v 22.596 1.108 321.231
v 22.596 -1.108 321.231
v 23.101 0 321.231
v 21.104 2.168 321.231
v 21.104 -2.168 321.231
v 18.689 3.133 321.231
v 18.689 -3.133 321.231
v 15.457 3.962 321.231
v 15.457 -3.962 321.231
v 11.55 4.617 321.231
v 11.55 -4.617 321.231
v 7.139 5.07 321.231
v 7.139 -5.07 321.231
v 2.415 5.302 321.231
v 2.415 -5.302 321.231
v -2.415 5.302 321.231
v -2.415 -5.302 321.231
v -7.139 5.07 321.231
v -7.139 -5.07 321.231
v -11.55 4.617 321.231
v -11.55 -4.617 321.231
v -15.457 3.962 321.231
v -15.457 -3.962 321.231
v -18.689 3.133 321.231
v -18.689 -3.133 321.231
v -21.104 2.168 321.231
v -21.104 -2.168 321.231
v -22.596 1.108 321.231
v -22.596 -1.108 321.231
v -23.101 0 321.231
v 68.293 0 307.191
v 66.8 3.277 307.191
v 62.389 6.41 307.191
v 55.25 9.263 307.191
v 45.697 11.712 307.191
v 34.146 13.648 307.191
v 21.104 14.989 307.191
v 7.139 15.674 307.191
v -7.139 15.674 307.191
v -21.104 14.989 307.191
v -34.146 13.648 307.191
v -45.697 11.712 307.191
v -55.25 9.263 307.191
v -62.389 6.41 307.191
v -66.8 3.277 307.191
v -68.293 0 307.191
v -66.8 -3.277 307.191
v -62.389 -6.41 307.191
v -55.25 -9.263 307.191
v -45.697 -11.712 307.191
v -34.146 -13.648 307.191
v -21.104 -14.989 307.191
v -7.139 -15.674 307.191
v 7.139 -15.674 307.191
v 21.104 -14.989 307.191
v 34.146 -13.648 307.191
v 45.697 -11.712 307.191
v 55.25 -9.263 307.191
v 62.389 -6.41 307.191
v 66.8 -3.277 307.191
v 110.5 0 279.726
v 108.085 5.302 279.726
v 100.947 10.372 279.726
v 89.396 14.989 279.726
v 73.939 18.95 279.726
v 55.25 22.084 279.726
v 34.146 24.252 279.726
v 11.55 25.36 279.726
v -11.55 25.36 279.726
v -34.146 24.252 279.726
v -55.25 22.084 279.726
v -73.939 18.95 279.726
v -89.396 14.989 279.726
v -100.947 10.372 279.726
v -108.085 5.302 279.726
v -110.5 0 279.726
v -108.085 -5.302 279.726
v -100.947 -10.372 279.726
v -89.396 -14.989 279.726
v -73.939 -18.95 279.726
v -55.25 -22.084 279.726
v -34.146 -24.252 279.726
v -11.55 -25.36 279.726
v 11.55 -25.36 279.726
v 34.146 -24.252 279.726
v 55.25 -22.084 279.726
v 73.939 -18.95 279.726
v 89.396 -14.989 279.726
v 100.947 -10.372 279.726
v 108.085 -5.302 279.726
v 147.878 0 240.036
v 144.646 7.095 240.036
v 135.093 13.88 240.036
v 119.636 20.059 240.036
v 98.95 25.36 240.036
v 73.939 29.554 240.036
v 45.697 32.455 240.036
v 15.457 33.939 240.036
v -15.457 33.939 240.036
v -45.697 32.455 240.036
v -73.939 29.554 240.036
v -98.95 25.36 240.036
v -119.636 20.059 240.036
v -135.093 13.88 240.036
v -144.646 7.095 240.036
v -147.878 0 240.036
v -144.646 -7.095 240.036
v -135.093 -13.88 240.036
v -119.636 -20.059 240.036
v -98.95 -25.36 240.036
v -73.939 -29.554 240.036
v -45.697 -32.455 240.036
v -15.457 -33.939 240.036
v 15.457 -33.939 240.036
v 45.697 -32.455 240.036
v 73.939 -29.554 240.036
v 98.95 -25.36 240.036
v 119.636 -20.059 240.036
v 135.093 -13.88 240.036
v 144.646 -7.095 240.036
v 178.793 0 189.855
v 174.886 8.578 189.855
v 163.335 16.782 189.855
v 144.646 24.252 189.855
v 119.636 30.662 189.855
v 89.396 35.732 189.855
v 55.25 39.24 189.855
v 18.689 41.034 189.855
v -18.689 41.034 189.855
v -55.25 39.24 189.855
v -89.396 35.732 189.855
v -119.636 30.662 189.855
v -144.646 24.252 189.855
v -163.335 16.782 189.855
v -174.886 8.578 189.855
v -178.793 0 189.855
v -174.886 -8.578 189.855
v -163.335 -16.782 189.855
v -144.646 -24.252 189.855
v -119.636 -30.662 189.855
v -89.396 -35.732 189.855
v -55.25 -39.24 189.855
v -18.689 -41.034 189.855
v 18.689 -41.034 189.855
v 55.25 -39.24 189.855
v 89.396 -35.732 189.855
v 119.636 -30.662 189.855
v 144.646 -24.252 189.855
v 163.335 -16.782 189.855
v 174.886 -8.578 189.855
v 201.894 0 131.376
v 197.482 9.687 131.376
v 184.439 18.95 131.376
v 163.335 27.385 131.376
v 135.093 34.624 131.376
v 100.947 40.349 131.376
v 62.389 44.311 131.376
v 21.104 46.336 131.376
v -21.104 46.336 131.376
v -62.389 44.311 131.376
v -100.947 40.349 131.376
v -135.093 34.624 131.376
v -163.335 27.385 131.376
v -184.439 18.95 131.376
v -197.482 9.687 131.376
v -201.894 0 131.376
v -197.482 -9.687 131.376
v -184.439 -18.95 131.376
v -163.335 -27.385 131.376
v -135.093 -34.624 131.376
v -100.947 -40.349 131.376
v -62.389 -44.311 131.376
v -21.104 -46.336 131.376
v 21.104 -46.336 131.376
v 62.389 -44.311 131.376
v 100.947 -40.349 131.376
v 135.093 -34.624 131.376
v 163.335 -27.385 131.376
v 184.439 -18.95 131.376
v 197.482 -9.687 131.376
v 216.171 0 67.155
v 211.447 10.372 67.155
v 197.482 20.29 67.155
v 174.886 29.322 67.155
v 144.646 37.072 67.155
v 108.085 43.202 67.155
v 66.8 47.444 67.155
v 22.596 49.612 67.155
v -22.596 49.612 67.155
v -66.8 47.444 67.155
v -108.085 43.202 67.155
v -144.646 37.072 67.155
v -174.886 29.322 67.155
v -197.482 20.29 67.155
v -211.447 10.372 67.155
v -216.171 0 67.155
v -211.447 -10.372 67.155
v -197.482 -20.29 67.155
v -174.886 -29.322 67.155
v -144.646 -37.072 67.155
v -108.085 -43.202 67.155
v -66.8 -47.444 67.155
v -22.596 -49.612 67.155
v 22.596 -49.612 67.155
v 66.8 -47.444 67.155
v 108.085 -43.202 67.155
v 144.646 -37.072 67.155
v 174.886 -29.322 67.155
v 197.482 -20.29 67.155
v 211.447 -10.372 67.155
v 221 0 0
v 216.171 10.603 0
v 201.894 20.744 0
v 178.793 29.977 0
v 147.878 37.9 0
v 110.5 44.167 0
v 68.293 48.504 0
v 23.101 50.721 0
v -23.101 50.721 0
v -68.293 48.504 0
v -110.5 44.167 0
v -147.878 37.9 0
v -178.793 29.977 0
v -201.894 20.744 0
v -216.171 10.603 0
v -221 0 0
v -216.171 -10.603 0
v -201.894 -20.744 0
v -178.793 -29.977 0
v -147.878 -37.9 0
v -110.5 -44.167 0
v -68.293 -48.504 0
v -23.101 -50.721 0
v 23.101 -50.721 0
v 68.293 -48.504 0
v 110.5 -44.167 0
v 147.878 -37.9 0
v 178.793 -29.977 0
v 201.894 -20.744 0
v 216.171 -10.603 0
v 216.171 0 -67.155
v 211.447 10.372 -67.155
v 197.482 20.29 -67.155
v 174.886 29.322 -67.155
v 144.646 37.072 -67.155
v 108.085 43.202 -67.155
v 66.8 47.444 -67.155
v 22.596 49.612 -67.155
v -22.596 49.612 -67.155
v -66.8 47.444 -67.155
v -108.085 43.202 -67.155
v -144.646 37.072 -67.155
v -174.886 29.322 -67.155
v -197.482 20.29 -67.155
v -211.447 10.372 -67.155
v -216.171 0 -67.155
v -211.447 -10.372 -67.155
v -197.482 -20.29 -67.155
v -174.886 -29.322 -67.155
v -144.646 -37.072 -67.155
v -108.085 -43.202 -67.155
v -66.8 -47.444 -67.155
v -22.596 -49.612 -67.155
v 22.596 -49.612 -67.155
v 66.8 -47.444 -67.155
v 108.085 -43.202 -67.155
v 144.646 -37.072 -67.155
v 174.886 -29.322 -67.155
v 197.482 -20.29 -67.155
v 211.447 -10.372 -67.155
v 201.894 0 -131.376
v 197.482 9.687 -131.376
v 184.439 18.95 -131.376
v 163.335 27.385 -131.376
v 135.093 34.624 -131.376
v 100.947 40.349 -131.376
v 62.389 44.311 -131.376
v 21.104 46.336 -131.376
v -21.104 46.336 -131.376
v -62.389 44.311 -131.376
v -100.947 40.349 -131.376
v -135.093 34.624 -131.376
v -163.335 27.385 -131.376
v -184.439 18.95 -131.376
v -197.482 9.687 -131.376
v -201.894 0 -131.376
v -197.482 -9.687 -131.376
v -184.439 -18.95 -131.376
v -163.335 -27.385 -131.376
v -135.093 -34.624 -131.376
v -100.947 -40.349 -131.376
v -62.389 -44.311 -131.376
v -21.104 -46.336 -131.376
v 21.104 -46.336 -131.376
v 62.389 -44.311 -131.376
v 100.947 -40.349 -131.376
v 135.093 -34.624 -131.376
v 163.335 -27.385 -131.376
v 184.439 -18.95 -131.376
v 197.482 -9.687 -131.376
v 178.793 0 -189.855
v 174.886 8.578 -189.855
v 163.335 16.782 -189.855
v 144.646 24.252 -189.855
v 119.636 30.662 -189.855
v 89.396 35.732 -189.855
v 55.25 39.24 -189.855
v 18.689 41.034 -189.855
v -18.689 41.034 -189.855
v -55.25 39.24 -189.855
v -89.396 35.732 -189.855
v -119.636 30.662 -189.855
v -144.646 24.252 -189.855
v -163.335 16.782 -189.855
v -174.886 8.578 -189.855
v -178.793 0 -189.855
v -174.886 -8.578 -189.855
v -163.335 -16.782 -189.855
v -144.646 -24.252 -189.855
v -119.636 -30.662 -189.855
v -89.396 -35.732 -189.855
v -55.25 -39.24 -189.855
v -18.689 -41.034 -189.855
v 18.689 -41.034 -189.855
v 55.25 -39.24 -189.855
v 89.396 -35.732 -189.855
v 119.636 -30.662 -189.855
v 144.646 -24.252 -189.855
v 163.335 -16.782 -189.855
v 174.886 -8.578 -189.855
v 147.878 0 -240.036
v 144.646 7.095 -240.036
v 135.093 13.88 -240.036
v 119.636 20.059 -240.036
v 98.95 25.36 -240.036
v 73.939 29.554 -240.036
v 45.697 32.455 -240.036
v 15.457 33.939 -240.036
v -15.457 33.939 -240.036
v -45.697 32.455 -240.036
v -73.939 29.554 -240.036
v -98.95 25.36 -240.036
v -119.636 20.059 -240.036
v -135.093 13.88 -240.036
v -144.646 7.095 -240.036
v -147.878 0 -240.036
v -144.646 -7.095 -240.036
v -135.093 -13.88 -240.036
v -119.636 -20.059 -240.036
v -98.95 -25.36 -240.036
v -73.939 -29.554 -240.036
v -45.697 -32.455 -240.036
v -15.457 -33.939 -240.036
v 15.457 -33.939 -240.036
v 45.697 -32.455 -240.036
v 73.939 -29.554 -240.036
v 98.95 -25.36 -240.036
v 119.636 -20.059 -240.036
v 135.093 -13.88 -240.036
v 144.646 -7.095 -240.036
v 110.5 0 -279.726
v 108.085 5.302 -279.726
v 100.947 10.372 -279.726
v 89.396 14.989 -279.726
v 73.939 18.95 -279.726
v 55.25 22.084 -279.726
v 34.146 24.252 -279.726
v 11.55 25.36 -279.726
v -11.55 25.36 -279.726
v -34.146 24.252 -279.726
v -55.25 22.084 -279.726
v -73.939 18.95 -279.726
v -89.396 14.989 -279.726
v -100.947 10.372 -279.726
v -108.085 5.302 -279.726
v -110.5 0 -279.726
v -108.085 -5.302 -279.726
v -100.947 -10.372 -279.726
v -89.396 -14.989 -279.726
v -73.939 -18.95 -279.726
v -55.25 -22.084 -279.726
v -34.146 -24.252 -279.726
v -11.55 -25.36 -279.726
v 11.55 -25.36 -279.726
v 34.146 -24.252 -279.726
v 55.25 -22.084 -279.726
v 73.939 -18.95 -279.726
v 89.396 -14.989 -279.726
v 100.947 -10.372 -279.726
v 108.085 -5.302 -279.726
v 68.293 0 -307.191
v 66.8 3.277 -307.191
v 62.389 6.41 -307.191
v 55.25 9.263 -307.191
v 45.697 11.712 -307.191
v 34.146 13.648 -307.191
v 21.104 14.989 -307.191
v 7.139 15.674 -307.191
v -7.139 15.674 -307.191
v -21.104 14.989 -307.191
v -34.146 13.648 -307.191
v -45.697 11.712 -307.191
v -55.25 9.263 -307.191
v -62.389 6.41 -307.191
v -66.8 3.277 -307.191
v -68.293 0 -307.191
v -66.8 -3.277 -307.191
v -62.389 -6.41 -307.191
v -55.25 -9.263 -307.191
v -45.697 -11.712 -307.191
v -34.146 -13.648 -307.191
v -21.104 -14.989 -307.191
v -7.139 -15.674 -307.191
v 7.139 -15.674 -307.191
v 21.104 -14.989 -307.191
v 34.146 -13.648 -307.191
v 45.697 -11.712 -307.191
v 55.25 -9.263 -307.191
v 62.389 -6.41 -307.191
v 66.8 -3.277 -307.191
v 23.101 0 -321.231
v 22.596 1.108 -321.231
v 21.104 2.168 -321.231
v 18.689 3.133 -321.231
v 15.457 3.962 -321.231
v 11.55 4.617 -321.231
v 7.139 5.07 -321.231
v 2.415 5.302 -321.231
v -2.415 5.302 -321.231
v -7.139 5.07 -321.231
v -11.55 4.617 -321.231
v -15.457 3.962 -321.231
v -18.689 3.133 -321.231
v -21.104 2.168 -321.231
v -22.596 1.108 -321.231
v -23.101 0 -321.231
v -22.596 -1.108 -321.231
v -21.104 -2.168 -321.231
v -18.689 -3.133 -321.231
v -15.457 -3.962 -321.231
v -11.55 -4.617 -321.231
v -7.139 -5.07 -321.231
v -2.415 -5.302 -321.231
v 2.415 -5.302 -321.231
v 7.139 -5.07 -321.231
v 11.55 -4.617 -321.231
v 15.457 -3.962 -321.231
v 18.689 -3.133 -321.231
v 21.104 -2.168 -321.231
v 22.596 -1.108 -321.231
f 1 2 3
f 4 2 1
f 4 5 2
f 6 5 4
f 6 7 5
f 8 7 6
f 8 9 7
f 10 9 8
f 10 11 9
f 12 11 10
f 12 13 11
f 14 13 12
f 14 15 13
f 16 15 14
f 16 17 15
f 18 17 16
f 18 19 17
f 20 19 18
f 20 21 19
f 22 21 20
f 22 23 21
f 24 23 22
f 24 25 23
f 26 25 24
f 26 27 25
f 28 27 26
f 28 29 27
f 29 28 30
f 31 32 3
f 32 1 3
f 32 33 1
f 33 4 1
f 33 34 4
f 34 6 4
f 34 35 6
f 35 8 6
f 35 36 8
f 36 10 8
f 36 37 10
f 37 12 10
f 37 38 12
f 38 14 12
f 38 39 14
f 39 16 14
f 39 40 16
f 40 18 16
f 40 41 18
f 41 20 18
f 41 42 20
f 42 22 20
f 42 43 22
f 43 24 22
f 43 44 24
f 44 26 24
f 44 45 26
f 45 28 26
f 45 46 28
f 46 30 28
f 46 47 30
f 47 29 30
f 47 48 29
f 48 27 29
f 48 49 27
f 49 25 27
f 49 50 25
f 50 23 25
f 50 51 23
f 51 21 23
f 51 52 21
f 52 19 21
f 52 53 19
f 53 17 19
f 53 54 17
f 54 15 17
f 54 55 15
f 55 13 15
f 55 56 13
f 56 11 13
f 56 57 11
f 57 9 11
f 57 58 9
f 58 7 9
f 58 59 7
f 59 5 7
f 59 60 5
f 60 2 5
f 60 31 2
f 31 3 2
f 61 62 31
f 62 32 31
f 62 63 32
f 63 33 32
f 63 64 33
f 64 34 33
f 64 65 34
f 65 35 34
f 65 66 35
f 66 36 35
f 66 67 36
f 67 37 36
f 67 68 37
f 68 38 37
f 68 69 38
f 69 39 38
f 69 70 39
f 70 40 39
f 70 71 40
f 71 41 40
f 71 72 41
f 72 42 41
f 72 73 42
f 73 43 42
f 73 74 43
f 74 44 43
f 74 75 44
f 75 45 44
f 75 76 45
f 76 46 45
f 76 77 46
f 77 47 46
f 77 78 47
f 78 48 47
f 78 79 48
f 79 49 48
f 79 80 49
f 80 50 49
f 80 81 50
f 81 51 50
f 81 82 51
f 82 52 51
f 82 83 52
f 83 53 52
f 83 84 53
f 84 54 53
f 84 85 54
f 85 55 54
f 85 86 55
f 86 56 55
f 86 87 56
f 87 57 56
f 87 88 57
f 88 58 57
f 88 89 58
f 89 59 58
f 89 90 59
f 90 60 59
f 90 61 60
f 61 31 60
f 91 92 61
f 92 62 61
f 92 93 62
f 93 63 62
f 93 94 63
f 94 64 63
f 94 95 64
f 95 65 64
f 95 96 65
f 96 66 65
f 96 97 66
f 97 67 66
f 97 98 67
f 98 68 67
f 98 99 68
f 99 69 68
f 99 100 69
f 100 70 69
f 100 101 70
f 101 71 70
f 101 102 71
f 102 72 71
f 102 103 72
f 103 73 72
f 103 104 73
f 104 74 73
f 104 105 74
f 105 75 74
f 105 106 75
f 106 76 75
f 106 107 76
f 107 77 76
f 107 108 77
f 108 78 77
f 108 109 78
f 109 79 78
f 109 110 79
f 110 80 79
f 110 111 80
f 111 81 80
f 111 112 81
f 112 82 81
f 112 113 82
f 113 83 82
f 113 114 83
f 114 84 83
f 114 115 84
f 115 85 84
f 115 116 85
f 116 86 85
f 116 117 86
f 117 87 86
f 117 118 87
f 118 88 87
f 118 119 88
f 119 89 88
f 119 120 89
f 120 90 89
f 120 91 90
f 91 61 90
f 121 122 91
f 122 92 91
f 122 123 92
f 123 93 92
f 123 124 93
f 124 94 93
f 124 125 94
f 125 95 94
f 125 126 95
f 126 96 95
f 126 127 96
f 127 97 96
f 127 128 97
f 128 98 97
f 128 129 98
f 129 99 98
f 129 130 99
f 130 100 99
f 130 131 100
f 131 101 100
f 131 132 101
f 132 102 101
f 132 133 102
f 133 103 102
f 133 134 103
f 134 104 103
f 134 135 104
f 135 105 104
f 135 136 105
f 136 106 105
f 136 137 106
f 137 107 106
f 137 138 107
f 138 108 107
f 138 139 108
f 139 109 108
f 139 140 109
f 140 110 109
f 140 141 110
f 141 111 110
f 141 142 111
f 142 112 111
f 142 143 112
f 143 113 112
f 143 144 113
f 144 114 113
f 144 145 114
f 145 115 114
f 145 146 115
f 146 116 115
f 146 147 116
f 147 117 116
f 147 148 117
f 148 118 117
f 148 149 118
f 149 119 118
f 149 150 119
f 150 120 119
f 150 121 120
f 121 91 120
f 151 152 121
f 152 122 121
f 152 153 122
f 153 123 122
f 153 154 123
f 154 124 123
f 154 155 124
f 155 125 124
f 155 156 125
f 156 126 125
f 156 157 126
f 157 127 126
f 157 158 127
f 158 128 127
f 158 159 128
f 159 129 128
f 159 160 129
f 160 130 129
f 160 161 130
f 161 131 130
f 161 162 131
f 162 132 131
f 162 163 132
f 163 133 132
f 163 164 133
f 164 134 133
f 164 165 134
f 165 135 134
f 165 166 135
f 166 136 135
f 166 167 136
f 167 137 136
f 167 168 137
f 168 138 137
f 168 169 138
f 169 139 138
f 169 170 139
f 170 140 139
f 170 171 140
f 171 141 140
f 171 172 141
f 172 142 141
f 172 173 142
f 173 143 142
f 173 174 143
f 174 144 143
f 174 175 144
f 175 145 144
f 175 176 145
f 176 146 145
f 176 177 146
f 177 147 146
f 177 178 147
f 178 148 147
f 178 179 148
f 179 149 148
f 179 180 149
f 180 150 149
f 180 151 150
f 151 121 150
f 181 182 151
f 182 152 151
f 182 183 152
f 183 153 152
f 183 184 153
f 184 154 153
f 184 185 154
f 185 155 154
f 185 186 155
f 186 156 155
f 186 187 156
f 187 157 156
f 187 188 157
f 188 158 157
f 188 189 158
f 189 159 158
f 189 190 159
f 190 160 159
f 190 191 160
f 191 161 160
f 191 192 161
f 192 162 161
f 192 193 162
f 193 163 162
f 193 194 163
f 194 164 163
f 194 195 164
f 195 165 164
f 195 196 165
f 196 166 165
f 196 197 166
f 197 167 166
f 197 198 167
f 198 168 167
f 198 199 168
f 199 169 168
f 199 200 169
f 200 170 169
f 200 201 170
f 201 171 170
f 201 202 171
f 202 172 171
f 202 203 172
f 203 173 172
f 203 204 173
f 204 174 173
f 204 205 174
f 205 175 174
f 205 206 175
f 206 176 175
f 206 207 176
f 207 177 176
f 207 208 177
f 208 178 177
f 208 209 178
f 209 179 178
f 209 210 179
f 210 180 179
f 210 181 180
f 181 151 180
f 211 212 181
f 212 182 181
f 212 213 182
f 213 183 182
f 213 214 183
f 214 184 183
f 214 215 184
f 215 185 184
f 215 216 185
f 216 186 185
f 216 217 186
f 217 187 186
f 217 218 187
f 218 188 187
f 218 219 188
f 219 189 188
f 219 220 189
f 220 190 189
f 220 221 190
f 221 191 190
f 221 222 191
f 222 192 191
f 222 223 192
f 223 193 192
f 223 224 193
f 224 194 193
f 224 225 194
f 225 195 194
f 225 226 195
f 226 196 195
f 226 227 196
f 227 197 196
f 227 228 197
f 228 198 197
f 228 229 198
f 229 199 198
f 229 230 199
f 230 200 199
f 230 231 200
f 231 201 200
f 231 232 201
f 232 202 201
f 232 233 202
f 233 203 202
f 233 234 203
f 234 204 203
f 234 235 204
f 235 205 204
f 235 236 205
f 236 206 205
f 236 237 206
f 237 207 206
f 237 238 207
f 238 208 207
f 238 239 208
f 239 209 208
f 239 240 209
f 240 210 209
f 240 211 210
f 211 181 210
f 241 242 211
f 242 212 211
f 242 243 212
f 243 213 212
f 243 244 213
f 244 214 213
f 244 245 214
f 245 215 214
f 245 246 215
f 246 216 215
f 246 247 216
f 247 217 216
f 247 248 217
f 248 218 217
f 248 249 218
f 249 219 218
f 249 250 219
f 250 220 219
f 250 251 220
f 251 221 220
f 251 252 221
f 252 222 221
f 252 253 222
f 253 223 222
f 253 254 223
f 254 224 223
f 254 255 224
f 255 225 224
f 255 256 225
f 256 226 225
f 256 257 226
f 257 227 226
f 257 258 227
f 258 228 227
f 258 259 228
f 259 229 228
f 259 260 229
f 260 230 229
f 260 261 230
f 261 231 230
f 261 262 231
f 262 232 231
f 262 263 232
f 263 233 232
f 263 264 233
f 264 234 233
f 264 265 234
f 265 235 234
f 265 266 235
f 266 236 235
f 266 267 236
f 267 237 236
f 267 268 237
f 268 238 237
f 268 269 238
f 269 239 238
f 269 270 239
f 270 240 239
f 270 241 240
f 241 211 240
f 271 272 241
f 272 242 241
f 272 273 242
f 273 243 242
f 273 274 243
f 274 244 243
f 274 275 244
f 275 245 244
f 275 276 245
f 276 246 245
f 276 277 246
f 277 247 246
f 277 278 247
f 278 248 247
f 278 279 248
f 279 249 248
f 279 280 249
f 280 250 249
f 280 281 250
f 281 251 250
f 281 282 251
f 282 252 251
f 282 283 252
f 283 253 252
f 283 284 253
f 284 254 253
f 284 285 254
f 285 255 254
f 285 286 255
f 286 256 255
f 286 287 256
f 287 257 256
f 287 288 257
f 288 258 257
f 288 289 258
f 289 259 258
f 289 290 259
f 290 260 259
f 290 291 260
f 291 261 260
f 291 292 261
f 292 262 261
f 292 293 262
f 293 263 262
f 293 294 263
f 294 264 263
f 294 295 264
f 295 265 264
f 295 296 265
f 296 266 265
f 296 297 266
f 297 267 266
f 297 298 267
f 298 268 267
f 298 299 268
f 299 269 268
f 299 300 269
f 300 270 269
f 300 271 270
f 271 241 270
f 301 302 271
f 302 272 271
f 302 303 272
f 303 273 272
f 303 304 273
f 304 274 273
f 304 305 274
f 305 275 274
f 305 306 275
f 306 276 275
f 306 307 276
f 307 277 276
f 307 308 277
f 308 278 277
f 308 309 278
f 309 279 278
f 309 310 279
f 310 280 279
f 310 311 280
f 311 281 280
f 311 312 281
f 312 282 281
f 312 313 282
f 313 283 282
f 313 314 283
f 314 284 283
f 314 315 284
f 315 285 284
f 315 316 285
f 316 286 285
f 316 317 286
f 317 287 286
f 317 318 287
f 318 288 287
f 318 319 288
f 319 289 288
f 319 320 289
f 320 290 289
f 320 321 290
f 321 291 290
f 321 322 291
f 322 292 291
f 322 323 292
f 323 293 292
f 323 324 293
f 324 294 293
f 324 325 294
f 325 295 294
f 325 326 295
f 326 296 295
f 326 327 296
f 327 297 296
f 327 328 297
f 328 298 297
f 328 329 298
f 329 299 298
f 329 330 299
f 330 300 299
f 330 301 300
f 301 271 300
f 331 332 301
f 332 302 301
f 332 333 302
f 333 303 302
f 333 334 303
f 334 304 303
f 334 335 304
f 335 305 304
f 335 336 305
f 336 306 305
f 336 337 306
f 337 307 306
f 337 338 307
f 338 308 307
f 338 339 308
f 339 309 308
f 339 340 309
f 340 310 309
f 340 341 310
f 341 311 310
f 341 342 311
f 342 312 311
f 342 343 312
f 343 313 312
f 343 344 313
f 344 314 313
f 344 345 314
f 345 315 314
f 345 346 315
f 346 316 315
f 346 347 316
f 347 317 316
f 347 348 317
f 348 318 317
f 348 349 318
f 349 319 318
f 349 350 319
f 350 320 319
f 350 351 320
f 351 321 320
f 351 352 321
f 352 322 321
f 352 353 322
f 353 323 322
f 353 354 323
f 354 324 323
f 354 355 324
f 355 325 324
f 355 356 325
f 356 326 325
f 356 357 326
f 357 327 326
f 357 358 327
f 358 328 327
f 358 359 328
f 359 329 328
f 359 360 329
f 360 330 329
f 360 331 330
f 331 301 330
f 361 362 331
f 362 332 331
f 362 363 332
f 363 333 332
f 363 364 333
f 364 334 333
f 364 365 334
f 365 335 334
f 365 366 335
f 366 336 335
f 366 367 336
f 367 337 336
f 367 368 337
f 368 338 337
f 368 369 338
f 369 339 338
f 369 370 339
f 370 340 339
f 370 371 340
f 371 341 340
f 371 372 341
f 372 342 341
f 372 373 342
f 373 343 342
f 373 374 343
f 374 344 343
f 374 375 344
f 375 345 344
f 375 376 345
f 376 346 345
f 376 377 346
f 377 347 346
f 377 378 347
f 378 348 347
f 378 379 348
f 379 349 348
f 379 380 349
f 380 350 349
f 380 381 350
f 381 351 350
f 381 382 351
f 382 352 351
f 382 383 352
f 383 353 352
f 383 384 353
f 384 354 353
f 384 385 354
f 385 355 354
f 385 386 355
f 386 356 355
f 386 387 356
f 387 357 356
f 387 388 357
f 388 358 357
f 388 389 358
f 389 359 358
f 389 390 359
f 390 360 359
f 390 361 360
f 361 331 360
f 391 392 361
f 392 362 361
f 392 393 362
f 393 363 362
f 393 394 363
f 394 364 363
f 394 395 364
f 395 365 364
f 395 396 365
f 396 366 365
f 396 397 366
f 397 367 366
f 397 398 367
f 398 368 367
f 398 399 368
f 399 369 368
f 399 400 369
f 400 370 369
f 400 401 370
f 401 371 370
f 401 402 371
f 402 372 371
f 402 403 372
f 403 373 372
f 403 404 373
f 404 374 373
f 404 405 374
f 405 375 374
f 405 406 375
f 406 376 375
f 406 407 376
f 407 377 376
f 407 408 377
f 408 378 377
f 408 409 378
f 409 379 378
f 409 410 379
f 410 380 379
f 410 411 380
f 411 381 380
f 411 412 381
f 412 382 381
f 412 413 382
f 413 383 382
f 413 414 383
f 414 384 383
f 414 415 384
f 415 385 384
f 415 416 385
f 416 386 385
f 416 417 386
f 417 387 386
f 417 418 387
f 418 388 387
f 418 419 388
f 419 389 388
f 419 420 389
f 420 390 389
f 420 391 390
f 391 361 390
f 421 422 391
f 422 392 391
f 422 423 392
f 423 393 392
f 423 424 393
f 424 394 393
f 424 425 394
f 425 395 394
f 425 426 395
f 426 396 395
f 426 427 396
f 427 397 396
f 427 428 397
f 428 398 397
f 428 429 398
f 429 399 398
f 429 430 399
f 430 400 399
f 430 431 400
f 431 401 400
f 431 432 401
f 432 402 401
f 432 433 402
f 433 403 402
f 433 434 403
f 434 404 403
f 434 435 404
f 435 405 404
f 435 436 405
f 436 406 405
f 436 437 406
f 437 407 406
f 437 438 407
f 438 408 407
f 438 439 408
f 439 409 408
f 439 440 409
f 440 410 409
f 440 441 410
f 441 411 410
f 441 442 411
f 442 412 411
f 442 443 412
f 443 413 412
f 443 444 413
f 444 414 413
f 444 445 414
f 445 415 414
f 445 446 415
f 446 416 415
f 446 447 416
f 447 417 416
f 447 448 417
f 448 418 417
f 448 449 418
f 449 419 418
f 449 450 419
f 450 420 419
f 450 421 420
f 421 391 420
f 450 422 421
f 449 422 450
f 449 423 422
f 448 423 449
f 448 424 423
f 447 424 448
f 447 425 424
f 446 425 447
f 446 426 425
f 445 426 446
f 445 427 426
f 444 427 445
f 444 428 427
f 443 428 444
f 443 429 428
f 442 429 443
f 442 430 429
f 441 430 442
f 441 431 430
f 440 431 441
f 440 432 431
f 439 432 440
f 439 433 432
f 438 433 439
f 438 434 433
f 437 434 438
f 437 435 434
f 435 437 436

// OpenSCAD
// Generated by SolidPython 1.0.1 on 2020-07-29 00:46:50


scale(v = [13, 3, 19]) {
	sphere(r = 17);
}
/***********************************************
*********      SolidPython code:      **********
************************************************
 
# import packages: SolidPython
from solid import *
from solid.utils import *
from itertools import chain, combinations, permutations


class Resize:

    def __init__(self, scad_file):
        self.scad_file = scad_file
        #self.scad_file = import_scad(scad_file)
        # cone/cylinder param:
        self.r1 = 0
        self.r2 = 0
        self.h = 0
        # rectangular prism param:
        self.w = 0
        self.l = 0
        # ellipse param:
        self.r = 0

    # import OpenScad code (file name corresponds to shape)


    # classify shape + parameters
    def assign(self, param1, param2, param3):
        if self.scad_file == 'cone.scad':
            self.r1 = param1
            self.r2 = param2
            self.h = param3
        elif self.scad_file == 'cylinder.scad':
            self.r1 = param1
            self.r2 = param2
            self.h = param3
        elif self.scad_file == 'rectangularPrism.scad':
            self.h = param1
            self.l = param2
            self.w = param3
        else:
            self.r = param1
            self.h = param2

    # resize parameters
    def iterate(self):
        x = range(3, 20, 2)
        i = 1
        if self.scad_file == 'cone.scad':
            tempList = list(permutations(x, 2))
            for temp in tempList:
                param1 = temp[0]
                param2 = temp[1]
                filepath = 'produced_scad_files/' + 'cone' + str(param1) + '_' + str(param2) + '_' + '.scad'
                scad_render_to_file(cylinder(h=param1, r1=param2, r2=0), filepath)

        elif self.scad_file == 'cylinder.scad':
            tempList = list(permutations(x, 3))
            for temp in tempList:
                param1 = temp[0]
                param2 = temp[1]
                filepath = 'produced_scad_files/' + 'cylinder' + str(param1) + '_' + str(param2) + '_' + '.scad'
                scad_render_to_file(cylinder(h=param1, r1=param2, r2=param2), filepath)

        elif self.scad_file == 'rectangularPrism.scad':
            tempList = list(permutations(x, 3))
            for temp in tempList:
                param1 = temp[0]
                param2 = temp[1]
                param3 = temp[2]
                filepath = 'produced_scad_files/' + 'rectangularPrism' + str(param1) + '_' + str(param2) + '_' + str(
                    param3) + '.scad'
                scad_render_to_file(cube(size=(param1, param2, param3)), filepath)

        elif self.scad_file == 'ellipse.scad':
            tempList = list(permutations(x, 4))
            for temp in tempList:
                param1 = temp[0]
                param2 = temp[1]
                param3 = temp[2]
                param4 = temp[3]
                filepath = 'produced_scad_files/' + 'ellipse' + str(param1) + '_' + str(param2) + '_' + str(param3) + '_' + str(param4) + '.scad'
                scad_render_to_file(scale([param1, param2, param3])(sphere(r=param4)), filepath)

    def render_to_scadfile(self):
        scad_render_to_file(scad, 'example.scad') 
 
************************************************/
